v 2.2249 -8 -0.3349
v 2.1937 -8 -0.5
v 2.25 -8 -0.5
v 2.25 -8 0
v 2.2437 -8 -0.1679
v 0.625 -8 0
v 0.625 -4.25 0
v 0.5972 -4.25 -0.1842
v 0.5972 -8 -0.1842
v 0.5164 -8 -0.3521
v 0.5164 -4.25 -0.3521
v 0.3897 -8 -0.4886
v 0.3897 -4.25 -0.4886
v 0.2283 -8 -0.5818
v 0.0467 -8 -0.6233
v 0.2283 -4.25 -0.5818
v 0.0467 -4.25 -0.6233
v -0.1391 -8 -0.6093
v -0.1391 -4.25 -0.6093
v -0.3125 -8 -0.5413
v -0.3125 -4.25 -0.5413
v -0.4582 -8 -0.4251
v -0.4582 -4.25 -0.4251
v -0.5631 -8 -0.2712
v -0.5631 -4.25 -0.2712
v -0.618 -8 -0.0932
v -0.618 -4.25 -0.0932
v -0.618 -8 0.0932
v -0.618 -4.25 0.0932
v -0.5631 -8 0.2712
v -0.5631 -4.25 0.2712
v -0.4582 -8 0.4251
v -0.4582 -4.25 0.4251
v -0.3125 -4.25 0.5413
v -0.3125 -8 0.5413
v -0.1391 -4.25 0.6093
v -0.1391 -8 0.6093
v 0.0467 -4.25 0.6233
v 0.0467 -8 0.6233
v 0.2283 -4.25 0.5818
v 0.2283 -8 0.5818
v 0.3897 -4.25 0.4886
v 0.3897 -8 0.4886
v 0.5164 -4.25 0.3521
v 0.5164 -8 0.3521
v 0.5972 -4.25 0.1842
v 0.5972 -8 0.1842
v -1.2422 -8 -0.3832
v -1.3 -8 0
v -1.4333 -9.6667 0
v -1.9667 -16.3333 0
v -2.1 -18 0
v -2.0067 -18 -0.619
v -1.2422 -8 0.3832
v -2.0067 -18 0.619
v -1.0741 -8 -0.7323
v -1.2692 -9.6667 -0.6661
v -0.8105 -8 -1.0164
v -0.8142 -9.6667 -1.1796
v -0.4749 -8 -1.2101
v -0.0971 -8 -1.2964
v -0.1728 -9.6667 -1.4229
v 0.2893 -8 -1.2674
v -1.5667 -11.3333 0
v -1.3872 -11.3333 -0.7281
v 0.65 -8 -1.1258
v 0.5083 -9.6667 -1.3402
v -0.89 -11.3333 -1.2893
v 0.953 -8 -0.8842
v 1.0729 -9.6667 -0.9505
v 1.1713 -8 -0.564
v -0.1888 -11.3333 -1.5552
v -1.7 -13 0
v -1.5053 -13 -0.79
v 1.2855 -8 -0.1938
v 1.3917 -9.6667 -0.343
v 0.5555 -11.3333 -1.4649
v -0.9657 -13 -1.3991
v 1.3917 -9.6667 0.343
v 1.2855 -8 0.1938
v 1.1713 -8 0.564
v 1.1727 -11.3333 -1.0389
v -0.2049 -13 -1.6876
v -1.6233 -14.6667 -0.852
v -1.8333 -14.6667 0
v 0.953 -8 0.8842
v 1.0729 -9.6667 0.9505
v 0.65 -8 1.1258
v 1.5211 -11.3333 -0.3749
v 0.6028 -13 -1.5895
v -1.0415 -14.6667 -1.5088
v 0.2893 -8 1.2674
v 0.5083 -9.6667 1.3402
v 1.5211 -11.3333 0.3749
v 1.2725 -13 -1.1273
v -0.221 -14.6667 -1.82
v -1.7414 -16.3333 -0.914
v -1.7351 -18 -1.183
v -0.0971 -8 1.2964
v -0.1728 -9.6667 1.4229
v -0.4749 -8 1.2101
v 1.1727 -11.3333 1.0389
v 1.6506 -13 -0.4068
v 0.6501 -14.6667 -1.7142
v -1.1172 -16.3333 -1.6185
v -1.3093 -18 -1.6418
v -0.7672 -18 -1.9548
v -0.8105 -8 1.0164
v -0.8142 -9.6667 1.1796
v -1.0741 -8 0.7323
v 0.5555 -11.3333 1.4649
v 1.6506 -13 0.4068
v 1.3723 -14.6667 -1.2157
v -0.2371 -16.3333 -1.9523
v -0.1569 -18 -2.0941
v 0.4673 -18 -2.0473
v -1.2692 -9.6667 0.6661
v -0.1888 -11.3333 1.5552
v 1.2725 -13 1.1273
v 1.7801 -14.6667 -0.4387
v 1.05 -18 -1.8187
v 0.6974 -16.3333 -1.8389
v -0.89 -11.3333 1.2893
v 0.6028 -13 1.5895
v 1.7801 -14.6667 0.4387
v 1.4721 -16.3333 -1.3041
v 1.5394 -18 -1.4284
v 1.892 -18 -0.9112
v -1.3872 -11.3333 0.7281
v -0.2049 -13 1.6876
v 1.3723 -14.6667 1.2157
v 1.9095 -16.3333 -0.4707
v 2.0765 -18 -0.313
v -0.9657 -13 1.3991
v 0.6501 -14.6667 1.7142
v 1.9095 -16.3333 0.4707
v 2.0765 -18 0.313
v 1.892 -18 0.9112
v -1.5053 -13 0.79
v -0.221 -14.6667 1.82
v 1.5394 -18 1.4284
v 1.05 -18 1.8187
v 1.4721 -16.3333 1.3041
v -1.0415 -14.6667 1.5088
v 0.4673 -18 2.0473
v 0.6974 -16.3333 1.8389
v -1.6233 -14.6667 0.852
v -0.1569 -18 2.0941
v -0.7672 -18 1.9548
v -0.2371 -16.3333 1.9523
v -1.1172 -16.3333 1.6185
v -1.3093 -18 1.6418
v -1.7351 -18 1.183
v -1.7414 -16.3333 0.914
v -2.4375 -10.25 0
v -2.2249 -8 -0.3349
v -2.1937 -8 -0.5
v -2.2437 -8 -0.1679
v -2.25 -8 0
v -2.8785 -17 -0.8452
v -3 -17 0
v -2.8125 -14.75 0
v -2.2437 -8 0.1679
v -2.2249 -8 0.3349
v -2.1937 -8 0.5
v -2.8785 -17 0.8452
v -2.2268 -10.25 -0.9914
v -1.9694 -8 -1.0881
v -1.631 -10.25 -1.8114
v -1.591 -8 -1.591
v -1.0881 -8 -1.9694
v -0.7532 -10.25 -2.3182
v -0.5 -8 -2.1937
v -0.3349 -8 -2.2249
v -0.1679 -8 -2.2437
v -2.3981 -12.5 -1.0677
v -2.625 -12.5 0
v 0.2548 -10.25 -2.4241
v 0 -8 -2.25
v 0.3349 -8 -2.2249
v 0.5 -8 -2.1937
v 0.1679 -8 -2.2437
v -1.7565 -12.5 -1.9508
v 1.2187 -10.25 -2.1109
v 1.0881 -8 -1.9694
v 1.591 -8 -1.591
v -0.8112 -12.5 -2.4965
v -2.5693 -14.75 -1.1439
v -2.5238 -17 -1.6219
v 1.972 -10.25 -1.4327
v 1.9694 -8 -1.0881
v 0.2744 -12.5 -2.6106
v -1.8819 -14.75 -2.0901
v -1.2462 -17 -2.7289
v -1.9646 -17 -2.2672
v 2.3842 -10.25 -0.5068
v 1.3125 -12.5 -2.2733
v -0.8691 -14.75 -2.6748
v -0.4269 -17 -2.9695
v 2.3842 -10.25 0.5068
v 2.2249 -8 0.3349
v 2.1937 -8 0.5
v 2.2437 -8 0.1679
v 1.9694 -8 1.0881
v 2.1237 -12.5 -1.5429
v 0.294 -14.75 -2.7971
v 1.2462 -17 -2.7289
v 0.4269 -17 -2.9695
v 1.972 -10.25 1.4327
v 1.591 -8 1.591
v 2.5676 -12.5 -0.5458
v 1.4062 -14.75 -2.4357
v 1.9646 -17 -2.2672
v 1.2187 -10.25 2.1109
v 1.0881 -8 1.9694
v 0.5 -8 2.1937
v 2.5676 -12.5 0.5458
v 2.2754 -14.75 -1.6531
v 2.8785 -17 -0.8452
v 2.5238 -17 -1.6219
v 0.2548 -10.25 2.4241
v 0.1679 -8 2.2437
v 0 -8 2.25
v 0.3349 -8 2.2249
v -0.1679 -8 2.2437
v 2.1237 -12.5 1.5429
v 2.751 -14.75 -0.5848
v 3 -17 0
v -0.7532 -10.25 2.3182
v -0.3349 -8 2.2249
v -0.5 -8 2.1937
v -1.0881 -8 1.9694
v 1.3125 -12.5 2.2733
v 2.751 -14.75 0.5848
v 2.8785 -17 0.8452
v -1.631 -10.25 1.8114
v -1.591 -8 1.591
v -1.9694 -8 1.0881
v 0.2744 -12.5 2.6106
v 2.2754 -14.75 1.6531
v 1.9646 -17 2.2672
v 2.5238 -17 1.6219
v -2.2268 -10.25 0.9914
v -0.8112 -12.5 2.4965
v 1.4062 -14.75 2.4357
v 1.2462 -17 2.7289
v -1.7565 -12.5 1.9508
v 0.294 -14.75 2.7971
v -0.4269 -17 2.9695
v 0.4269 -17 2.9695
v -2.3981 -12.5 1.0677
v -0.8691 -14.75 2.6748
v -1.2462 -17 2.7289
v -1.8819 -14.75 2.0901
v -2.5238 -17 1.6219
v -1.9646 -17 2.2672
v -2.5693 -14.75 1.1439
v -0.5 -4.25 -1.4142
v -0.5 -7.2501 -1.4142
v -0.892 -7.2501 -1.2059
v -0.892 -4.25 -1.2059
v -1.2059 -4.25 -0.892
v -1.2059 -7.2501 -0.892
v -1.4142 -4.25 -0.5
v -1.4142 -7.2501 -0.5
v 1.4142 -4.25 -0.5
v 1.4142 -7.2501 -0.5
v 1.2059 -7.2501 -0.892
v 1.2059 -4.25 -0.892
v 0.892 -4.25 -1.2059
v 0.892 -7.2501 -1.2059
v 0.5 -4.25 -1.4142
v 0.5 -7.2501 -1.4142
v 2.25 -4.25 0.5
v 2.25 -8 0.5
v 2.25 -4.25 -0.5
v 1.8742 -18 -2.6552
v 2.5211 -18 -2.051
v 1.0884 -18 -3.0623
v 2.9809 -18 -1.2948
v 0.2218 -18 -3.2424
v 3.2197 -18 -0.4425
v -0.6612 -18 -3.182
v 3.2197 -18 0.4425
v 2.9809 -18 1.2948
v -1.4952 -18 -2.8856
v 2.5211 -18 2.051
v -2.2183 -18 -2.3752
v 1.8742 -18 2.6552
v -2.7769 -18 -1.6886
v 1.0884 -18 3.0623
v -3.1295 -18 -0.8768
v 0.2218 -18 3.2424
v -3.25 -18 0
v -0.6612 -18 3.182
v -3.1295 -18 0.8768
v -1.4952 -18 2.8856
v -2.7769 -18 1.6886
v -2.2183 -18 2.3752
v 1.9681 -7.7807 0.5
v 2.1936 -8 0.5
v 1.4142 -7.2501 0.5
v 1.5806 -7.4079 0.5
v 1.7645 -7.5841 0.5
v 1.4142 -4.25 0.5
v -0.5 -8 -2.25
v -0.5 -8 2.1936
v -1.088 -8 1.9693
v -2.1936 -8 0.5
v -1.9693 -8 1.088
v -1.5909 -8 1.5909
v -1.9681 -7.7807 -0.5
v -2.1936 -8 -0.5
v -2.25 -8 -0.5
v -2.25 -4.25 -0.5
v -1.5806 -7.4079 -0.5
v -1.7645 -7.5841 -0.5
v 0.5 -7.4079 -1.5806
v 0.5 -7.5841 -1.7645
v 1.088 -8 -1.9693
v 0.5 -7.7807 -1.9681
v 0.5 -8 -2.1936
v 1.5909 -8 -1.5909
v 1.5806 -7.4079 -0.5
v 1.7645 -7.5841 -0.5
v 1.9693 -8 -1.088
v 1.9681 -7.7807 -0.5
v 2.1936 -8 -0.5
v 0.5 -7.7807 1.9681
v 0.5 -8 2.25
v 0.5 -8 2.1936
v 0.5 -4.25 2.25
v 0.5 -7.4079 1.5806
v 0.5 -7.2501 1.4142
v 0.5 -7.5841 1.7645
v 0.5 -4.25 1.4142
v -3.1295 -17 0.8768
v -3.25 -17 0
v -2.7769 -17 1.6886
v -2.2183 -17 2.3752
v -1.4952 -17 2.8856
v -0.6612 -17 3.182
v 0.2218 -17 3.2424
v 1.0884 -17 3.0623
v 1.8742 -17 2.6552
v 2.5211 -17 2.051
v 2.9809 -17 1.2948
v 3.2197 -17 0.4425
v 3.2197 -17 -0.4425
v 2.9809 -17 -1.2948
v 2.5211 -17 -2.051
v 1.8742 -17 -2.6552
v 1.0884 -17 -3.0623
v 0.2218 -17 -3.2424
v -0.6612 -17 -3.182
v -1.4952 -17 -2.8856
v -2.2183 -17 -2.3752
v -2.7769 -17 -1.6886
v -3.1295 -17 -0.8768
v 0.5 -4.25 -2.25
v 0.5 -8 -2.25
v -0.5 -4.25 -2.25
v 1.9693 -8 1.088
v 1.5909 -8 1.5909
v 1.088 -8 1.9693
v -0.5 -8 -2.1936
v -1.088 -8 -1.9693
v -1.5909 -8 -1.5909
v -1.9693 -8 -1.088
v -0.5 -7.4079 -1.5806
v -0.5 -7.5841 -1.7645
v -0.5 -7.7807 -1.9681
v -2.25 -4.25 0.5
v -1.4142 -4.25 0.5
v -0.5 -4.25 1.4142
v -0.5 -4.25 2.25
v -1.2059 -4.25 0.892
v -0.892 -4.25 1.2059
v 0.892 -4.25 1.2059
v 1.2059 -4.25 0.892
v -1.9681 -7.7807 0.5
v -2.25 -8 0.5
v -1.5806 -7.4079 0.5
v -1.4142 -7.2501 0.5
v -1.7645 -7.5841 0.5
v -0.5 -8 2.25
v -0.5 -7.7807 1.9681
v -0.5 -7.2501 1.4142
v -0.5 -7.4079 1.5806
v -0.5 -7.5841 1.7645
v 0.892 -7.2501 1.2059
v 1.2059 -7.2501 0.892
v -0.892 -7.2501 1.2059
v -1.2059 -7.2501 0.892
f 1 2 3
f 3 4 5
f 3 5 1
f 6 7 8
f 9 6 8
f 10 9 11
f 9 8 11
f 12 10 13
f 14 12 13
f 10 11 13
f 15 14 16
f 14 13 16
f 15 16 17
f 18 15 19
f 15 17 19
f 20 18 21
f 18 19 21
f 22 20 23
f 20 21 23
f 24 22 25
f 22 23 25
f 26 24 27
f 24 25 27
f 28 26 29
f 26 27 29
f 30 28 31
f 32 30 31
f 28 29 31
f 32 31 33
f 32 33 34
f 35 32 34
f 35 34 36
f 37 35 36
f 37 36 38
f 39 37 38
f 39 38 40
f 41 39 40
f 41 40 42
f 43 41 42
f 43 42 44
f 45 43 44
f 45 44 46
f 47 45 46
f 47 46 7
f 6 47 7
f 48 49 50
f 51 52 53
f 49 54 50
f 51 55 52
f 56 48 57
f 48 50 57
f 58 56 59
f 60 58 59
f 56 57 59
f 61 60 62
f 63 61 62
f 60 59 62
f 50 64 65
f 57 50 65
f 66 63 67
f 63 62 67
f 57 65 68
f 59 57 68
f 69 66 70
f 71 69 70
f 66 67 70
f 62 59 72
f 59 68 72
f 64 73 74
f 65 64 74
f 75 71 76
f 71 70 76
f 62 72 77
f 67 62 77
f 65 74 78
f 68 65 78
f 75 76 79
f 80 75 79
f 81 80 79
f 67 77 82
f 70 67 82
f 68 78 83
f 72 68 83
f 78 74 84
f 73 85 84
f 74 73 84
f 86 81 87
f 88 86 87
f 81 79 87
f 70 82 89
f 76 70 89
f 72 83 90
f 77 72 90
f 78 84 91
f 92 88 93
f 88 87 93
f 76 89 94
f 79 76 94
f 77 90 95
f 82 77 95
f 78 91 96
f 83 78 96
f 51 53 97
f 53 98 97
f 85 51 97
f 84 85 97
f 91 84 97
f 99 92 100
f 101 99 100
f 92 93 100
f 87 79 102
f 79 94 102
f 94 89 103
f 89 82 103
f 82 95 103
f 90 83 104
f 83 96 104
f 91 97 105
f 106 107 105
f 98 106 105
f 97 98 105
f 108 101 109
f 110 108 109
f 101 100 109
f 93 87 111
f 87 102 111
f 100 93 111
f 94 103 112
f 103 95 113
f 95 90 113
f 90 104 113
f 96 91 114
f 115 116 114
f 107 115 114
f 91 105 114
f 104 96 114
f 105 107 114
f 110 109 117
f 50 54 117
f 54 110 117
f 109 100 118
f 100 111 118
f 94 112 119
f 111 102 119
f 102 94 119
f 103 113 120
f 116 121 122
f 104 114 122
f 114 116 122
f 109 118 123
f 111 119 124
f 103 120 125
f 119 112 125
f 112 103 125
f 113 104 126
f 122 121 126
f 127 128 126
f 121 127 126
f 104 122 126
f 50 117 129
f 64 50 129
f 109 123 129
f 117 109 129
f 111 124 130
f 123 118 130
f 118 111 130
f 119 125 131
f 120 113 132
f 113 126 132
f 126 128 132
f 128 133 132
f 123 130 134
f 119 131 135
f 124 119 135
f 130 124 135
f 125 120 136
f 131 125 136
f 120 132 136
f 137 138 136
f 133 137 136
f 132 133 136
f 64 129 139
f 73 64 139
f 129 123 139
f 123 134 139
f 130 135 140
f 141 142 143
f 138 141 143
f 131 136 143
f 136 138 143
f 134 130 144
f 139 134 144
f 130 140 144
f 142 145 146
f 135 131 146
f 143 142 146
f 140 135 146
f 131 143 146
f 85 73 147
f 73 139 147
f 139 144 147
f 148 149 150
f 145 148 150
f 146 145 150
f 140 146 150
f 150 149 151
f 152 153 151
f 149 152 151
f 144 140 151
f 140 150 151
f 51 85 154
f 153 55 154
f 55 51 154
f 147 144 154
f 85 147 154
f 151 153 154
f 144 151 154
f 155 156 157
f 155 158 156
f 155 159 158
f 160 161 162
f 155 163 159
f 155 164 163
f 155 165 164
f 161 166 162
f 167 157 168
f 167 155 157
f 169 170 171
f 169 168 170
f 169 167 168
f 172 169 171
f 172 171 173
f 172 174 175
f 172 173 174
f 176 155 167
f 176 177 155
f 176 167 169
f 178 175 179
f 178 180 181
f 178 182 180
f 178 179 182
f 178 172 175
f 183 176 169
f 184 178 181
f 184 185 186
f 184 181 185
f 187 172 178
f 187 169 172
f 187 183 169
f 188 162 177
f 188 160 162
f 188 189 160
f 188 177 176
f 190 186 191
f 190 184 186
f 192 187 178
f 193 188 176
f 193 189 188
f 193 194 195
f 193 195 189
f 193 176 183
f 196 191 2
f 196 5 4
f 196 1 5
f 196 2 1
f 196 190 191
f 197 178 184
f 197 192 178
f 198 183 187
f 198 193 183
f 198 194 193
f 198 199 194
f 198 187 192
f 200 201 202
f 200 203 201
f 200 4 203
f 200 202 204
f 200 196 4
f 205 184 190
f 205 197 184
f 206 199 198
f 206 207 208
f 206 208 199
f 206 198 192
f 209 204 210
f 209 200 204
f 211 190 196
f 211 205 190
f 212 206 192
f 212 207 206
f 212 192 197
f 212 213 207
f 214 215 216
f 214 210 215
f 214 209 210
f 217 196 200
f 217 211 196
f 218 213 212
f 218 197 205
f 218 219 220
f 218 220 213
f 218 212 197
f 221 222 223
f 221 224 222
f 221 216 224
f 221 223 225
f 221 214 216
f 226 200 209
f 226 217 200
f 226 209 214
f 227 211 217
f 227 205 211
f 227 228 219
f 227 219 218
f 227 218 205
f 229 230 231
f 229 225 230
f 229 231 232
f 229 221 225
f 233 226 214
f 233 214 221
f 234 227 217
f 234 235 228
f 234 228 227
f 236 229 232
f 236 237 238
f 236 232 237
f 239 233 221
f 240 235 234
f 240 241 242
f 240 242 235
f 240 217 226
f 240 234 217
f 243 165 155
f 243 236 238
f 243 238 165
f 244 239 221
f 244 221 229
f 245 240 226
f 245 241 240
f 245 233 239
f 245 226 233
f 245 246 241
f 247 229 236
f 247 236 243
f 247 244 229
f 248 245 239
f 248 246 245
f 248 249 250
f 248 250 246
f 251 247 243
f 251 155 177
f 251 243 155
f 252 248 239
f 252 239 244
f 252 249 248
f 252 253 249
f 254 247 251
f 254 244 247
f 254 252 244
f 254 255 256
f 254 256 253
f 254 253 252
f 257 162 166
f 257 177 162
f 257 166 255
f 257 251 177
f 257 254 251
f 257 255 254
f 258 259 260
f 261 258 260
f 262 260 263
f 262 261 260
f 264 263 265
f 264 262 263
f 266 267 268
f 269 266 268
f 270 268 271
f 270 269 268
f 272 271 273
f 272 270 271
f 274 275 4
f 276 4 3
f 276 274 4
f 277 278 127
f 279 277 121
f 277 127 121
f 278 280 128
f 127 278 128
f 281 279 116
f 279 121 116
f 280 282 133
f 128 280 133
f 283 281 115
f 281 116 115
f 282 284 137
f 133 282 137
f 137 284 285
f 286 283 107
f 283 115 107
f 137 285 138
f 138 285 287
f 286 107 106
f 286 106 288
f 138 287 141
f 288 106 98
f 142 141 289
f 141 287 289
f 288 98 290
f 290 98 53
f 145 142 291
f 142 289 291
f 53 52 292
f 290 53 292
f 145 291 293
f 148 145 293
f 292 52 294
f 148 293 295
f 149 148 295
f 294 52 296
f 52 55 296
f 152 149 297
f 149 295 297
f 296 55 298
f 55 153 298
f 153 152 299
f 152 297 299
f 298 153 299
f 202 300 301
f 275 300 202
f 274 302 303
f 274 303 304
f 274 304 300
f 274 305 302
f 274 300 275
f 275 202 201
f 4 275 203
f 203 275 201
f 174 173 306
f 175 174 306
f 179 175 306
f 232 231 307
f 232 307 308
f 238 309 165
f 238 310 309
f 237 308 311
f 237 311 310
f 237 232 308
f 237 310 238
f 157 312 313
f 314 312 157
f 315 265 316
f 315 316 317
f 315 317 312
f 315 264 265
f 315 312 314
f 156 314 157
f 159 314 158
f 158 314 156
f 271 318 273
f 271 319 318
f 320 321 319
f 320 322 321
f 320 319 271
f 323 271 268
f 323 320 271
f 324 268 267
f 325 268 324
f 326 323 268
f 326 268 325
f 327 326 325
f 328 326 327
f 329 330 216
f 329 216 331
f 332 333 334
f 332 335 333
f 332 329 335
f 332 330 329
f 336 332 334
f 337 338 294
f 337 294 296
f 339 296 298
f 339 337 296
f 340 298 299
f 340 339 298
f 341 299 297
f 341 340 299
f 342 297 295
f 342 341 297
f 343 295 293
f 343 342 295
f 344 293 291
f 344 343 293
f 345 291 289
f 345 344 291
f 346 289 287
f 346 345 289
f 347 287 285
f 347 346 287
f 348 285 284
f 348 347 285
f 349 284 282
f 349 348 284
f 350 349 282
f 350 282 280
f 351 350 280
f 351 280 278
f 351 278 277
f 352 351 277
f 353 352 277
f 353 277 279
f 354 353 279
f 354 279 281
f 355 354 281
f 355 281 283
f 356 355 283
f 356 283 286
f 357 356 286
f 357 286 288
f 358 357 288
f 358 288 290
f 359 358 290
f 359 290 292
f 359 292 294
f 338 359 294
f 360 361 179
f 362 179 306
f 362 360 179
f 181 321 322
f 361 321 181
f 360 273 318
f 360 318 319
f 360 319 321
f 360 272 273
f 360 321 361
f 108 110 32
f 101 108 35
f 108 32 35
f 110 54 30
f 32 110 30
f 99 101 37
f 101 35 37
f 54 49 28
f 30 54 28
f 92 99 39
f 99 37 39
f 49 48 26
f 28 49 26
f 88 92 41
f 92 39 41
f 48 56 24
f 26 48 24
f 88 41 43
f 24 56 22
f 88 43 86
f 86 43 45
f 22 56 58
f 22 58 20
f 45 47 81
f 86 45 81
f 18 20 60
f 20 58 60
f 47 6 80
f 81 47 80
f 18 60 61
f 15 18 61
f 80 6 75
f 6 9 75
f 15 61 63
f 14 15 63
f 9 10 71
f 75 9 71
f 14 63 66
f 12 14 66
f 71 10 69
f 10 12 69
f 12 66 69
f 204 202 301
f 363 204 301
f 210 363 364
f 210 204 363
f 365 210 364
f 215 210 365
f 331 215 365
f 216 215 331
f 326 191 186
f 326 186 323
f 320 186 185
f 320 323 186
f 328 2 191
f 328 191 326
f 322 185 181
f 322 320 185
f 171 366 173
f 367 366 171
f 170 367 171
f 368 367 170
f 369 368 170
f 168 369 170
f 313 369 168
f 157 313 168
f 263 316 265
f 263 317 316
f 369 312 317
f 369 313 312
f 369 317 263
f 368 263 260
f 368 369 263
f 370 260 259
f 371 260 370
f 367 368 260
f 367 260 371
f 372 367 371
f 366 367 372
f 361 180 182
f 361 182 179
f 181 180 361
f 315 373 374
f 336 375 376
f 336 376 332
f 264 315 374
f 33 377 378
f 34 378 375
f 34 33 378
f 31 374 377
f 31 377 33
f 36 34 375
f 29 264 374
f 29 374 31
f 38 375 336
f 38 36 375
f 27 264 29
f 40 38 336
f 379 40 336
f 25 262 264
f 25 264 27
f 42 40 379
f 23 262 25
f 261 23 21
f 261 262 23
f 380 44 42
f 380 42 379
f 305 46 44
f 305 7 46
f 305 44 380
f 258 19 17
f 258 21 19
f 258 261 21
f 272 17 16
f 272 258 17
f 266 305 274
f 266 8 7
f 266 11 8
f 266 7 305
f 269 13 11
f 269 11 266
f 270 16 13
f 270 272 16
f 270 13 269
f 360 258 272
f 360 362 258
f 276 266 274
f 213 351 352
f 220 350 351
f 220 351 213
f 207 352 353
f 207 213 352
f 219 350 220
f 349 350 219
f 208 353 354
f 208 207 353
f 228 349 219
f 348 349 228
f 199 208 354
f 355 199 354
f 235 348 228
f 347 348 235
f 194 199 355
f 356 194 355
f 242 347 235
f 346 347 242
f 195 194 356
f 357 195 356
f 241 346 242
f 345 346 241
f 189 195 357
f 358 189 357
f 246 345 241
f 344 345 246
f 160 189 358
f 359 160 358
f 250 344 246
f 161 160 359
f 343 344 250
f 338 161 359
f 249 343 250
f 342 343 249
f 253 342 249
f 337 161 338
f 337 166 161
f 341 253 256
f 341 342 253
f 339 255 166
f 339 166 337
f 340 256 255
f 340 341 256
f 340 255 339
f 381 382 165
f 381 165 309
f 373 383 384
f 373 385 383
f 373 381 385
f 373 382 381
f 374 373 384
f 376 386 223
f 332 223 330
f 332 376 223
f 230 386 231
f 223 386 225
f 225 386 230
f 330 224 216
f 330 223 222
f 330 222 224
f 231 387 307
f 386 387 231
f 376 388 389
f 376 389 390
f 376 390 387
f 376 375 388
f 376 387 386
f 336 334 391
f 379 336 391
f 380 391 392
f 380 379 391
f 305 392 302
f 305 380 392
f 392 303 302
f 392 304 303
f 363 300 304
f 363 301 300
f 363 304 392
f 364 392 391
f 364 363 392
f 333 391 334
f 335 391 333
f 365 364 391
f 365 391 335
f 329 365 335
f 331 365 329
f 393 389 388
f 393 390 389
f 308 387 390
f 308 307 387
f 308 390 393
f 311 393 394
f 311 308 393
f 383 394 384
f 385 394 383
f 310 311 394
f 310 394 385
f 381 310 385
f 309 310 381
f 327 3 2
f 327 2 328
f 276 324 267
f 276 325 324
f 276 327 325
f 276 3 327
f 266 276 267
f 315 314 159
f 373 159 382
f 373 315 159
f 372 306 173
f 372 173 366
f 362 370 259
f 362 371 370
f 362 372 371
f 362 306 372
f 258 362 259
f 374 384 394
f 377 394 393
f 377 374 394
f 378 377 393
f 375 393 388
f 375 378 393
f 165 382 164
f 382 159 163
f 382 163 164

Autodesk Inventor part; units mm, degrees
ref_plane "YZ Plane" through (0, 0, 0) normal (1, 0, 0) x (0, 1, 0)
ref_plane "XZ Plane" through (0, 0, 0) normal (0, 1, 0) x (-1, 0, 0)
ref_plane "XY Plane" through (0, 0, 0) normal (0, 0, 1) x (1, 0, 0)
sketch "Sketch1" plane through (0, 0, 0) normal (0, 1, 0) x (-1, 0, 0)
  circle A0 centre (0, 0) radius 0.525
  circle A1 centre (0, 0) radius 0.625
  dimension "d0" = 1.25
  dimension "d1" = 0.1
extrude "Extrusion1" add sketch "Sketch1" along normal blind 25
sketch "Sketch2" plane through (0, 0, 0) normal (1, 0, 0) x (0, 1, 0)
  line L0 (25, -0.625) -> (25, 0.625) construction
  line L1 (25, 0.625) -> (23.5, -0.625)
  line L2 (25, 0.625) -> (25, -0.625)
  line L3 (25, -0.625) -> (23.5, -0.625)
  point P0 (0, 0)
  dimension "d4" = 1.5
extrude "Extrusion2" cut sketch "Sketch2" along normal through all both and the other way through all
sketch "Sketch3" plane through (0, 0, 0) normal (0, -1, 0) x (1, 0, 0)
  circle A0 centre (0, 0) radius 1.5
  circle A1 centre (0, 0) radius 0.625
  circle A2 centre (0, 0) radius 0.625 construction
  dimension "d7" = 3
extrude "Extrusion3" add sketch "Sketch3" along normal blind 1 separate body
sketch "Sketch4" plane through (0, -1, 0) normal (0, -1, 0) x (1, 0, 0)
  line L0 (0.5, -1.4142) -> (0.5, -2.25)
  line L1 (0.5, -2.25) -> (-0.5, -2.25)
  line L2 (-0.5, -2.25) -> (-0.5, -1.4142)
  arc A0 (-0.5, -1.4142) -> (0.5, -1.4142) centre (0, 0) ccw
  circle A1 centre (0, 0) radius 1.5 projected
  line L3 (1.4142, 0.5) -> (2.25, 0.5)
  line L4 (2.25, 0.5) -> (2.25, -0.5)
  line L5 (2.25, -0.5) -> (1.4142, -0.5)
  arc A2 (1.4142, -0.5) -> (1.4142, 0.5) centre (0, 0) ccw
  line L6 (-0.5, 1.4142) -> (-0.5, 2.25)
  line L7 (-0.5, 2.25) -> (0.5, 2.25)
  line L8 (0.5, 2.25) -> (0.5, 1.4142)
  arc A3 (0.5, 1.4142) -> (-0.5, 1.4142) centre (0, 0) ccw
  line L9 (-1.4142, -0.5) -> (-2.25, -0.5)
  line L10 (-2.25, -0.5) -> (-2.25, 0.5)
  line L11 (-2.25, 0.5) -> (-1.4142, 0.5)
  arc A4 (-1.4142, 0.5) -> (-1.4142, -0.5) centre (0, 0) ccw
  circle A5 centre (0, 0) radius 1.5 construction
  circle A6 centre (0, 0) radius 1.5 construction
  circle A7 centre (0, 0) radius 1.5
  circle A8 centre (0, 0) radius 1.3
  dimension "d20" = 2.25
  dimension "d21" = 1
  dimension "d24" = 360
  dimension "d26" = 0.2
extrude "Extrusion4" add sketch "Sketch4" along normal blind 7 bodies 2
sketch "Sketch5" plane through (0, 0, 0) normal (0, 0, 1) x (1, 0, 0)
  line L0 (1.3, -8) -> (-1.3, -8) construction
  line L1 (-1.3, -8) -> (-2.1, -18)
  line L2 (-2.1, -18) -> (-3.25, -18)
  line L3 (-3.25, -18) -> (-3.25, -17)
  line L4 (-3.25, -17) -> (-3, -17)
  line L5 (-2.25, -8) -> (-1.4142, -8) construction
  line L6 (-3, -17) -> (-2.25, -8)
  line L7 (-2.25, -8) -> (-1.3, -8)
  line L8 (0, -26.6) -> (0, 33.6) projected
  point P0 (0, 0)
  dimension "d27" = 2.1
  dimension "d28" = 3.25
  dimension "d29" = 3
  dimension "d30" = 9
  dimension "d31" = 1
revolve "Revolution1" add sketch "Sketch5" angle 360 about axis through (0, -10, 0) along (0, 1, 0) bodies 2
chamfer "Chamfer1" distance 0.25 angle 45 4 edges at (2.25, -1, 0) (0, -1, -2.25) (-2.25, -1, 0) (0, -1, 2.25)
chamfer "Chamfer2" distance 0.75 angle 45 4 edges at (1.0607, -8, 1.0607) (1.0607, -8, -1.0607) (-1.0607, -8, -1.0607) (-1.0607, -8, 1.0607)
sketch "Sketch7" plane through (0, 0, 0) normal (0, 1, 0) x (1, 0, 0)
  circle A0 centre (0, 0) radius 0.625 projected
  circle A1 centre (0, 0) radius 2.3049
  point P0 (0.5, 2.25)
extrude "Extrusion6" cut sketch "Sketch7" along normal blind 30 and the other way blind 4.25 contours A0 | A1 bodies 2 1
sketch "Sketch8" plane through (0, -4.25, 0) normal (0, 1, 0) x (1, 0, 0)
  circle A0 centre (0, 0) radius 0.625
  circle A1 centre (0, 0) radius 1.3 projected
  dimension "d49" = 1.25
extrude "Extrusion7" add sketch "Sketch8" against normal blind 3.75 bodies 2
properties part number "CH_01_0030_needle_1"
